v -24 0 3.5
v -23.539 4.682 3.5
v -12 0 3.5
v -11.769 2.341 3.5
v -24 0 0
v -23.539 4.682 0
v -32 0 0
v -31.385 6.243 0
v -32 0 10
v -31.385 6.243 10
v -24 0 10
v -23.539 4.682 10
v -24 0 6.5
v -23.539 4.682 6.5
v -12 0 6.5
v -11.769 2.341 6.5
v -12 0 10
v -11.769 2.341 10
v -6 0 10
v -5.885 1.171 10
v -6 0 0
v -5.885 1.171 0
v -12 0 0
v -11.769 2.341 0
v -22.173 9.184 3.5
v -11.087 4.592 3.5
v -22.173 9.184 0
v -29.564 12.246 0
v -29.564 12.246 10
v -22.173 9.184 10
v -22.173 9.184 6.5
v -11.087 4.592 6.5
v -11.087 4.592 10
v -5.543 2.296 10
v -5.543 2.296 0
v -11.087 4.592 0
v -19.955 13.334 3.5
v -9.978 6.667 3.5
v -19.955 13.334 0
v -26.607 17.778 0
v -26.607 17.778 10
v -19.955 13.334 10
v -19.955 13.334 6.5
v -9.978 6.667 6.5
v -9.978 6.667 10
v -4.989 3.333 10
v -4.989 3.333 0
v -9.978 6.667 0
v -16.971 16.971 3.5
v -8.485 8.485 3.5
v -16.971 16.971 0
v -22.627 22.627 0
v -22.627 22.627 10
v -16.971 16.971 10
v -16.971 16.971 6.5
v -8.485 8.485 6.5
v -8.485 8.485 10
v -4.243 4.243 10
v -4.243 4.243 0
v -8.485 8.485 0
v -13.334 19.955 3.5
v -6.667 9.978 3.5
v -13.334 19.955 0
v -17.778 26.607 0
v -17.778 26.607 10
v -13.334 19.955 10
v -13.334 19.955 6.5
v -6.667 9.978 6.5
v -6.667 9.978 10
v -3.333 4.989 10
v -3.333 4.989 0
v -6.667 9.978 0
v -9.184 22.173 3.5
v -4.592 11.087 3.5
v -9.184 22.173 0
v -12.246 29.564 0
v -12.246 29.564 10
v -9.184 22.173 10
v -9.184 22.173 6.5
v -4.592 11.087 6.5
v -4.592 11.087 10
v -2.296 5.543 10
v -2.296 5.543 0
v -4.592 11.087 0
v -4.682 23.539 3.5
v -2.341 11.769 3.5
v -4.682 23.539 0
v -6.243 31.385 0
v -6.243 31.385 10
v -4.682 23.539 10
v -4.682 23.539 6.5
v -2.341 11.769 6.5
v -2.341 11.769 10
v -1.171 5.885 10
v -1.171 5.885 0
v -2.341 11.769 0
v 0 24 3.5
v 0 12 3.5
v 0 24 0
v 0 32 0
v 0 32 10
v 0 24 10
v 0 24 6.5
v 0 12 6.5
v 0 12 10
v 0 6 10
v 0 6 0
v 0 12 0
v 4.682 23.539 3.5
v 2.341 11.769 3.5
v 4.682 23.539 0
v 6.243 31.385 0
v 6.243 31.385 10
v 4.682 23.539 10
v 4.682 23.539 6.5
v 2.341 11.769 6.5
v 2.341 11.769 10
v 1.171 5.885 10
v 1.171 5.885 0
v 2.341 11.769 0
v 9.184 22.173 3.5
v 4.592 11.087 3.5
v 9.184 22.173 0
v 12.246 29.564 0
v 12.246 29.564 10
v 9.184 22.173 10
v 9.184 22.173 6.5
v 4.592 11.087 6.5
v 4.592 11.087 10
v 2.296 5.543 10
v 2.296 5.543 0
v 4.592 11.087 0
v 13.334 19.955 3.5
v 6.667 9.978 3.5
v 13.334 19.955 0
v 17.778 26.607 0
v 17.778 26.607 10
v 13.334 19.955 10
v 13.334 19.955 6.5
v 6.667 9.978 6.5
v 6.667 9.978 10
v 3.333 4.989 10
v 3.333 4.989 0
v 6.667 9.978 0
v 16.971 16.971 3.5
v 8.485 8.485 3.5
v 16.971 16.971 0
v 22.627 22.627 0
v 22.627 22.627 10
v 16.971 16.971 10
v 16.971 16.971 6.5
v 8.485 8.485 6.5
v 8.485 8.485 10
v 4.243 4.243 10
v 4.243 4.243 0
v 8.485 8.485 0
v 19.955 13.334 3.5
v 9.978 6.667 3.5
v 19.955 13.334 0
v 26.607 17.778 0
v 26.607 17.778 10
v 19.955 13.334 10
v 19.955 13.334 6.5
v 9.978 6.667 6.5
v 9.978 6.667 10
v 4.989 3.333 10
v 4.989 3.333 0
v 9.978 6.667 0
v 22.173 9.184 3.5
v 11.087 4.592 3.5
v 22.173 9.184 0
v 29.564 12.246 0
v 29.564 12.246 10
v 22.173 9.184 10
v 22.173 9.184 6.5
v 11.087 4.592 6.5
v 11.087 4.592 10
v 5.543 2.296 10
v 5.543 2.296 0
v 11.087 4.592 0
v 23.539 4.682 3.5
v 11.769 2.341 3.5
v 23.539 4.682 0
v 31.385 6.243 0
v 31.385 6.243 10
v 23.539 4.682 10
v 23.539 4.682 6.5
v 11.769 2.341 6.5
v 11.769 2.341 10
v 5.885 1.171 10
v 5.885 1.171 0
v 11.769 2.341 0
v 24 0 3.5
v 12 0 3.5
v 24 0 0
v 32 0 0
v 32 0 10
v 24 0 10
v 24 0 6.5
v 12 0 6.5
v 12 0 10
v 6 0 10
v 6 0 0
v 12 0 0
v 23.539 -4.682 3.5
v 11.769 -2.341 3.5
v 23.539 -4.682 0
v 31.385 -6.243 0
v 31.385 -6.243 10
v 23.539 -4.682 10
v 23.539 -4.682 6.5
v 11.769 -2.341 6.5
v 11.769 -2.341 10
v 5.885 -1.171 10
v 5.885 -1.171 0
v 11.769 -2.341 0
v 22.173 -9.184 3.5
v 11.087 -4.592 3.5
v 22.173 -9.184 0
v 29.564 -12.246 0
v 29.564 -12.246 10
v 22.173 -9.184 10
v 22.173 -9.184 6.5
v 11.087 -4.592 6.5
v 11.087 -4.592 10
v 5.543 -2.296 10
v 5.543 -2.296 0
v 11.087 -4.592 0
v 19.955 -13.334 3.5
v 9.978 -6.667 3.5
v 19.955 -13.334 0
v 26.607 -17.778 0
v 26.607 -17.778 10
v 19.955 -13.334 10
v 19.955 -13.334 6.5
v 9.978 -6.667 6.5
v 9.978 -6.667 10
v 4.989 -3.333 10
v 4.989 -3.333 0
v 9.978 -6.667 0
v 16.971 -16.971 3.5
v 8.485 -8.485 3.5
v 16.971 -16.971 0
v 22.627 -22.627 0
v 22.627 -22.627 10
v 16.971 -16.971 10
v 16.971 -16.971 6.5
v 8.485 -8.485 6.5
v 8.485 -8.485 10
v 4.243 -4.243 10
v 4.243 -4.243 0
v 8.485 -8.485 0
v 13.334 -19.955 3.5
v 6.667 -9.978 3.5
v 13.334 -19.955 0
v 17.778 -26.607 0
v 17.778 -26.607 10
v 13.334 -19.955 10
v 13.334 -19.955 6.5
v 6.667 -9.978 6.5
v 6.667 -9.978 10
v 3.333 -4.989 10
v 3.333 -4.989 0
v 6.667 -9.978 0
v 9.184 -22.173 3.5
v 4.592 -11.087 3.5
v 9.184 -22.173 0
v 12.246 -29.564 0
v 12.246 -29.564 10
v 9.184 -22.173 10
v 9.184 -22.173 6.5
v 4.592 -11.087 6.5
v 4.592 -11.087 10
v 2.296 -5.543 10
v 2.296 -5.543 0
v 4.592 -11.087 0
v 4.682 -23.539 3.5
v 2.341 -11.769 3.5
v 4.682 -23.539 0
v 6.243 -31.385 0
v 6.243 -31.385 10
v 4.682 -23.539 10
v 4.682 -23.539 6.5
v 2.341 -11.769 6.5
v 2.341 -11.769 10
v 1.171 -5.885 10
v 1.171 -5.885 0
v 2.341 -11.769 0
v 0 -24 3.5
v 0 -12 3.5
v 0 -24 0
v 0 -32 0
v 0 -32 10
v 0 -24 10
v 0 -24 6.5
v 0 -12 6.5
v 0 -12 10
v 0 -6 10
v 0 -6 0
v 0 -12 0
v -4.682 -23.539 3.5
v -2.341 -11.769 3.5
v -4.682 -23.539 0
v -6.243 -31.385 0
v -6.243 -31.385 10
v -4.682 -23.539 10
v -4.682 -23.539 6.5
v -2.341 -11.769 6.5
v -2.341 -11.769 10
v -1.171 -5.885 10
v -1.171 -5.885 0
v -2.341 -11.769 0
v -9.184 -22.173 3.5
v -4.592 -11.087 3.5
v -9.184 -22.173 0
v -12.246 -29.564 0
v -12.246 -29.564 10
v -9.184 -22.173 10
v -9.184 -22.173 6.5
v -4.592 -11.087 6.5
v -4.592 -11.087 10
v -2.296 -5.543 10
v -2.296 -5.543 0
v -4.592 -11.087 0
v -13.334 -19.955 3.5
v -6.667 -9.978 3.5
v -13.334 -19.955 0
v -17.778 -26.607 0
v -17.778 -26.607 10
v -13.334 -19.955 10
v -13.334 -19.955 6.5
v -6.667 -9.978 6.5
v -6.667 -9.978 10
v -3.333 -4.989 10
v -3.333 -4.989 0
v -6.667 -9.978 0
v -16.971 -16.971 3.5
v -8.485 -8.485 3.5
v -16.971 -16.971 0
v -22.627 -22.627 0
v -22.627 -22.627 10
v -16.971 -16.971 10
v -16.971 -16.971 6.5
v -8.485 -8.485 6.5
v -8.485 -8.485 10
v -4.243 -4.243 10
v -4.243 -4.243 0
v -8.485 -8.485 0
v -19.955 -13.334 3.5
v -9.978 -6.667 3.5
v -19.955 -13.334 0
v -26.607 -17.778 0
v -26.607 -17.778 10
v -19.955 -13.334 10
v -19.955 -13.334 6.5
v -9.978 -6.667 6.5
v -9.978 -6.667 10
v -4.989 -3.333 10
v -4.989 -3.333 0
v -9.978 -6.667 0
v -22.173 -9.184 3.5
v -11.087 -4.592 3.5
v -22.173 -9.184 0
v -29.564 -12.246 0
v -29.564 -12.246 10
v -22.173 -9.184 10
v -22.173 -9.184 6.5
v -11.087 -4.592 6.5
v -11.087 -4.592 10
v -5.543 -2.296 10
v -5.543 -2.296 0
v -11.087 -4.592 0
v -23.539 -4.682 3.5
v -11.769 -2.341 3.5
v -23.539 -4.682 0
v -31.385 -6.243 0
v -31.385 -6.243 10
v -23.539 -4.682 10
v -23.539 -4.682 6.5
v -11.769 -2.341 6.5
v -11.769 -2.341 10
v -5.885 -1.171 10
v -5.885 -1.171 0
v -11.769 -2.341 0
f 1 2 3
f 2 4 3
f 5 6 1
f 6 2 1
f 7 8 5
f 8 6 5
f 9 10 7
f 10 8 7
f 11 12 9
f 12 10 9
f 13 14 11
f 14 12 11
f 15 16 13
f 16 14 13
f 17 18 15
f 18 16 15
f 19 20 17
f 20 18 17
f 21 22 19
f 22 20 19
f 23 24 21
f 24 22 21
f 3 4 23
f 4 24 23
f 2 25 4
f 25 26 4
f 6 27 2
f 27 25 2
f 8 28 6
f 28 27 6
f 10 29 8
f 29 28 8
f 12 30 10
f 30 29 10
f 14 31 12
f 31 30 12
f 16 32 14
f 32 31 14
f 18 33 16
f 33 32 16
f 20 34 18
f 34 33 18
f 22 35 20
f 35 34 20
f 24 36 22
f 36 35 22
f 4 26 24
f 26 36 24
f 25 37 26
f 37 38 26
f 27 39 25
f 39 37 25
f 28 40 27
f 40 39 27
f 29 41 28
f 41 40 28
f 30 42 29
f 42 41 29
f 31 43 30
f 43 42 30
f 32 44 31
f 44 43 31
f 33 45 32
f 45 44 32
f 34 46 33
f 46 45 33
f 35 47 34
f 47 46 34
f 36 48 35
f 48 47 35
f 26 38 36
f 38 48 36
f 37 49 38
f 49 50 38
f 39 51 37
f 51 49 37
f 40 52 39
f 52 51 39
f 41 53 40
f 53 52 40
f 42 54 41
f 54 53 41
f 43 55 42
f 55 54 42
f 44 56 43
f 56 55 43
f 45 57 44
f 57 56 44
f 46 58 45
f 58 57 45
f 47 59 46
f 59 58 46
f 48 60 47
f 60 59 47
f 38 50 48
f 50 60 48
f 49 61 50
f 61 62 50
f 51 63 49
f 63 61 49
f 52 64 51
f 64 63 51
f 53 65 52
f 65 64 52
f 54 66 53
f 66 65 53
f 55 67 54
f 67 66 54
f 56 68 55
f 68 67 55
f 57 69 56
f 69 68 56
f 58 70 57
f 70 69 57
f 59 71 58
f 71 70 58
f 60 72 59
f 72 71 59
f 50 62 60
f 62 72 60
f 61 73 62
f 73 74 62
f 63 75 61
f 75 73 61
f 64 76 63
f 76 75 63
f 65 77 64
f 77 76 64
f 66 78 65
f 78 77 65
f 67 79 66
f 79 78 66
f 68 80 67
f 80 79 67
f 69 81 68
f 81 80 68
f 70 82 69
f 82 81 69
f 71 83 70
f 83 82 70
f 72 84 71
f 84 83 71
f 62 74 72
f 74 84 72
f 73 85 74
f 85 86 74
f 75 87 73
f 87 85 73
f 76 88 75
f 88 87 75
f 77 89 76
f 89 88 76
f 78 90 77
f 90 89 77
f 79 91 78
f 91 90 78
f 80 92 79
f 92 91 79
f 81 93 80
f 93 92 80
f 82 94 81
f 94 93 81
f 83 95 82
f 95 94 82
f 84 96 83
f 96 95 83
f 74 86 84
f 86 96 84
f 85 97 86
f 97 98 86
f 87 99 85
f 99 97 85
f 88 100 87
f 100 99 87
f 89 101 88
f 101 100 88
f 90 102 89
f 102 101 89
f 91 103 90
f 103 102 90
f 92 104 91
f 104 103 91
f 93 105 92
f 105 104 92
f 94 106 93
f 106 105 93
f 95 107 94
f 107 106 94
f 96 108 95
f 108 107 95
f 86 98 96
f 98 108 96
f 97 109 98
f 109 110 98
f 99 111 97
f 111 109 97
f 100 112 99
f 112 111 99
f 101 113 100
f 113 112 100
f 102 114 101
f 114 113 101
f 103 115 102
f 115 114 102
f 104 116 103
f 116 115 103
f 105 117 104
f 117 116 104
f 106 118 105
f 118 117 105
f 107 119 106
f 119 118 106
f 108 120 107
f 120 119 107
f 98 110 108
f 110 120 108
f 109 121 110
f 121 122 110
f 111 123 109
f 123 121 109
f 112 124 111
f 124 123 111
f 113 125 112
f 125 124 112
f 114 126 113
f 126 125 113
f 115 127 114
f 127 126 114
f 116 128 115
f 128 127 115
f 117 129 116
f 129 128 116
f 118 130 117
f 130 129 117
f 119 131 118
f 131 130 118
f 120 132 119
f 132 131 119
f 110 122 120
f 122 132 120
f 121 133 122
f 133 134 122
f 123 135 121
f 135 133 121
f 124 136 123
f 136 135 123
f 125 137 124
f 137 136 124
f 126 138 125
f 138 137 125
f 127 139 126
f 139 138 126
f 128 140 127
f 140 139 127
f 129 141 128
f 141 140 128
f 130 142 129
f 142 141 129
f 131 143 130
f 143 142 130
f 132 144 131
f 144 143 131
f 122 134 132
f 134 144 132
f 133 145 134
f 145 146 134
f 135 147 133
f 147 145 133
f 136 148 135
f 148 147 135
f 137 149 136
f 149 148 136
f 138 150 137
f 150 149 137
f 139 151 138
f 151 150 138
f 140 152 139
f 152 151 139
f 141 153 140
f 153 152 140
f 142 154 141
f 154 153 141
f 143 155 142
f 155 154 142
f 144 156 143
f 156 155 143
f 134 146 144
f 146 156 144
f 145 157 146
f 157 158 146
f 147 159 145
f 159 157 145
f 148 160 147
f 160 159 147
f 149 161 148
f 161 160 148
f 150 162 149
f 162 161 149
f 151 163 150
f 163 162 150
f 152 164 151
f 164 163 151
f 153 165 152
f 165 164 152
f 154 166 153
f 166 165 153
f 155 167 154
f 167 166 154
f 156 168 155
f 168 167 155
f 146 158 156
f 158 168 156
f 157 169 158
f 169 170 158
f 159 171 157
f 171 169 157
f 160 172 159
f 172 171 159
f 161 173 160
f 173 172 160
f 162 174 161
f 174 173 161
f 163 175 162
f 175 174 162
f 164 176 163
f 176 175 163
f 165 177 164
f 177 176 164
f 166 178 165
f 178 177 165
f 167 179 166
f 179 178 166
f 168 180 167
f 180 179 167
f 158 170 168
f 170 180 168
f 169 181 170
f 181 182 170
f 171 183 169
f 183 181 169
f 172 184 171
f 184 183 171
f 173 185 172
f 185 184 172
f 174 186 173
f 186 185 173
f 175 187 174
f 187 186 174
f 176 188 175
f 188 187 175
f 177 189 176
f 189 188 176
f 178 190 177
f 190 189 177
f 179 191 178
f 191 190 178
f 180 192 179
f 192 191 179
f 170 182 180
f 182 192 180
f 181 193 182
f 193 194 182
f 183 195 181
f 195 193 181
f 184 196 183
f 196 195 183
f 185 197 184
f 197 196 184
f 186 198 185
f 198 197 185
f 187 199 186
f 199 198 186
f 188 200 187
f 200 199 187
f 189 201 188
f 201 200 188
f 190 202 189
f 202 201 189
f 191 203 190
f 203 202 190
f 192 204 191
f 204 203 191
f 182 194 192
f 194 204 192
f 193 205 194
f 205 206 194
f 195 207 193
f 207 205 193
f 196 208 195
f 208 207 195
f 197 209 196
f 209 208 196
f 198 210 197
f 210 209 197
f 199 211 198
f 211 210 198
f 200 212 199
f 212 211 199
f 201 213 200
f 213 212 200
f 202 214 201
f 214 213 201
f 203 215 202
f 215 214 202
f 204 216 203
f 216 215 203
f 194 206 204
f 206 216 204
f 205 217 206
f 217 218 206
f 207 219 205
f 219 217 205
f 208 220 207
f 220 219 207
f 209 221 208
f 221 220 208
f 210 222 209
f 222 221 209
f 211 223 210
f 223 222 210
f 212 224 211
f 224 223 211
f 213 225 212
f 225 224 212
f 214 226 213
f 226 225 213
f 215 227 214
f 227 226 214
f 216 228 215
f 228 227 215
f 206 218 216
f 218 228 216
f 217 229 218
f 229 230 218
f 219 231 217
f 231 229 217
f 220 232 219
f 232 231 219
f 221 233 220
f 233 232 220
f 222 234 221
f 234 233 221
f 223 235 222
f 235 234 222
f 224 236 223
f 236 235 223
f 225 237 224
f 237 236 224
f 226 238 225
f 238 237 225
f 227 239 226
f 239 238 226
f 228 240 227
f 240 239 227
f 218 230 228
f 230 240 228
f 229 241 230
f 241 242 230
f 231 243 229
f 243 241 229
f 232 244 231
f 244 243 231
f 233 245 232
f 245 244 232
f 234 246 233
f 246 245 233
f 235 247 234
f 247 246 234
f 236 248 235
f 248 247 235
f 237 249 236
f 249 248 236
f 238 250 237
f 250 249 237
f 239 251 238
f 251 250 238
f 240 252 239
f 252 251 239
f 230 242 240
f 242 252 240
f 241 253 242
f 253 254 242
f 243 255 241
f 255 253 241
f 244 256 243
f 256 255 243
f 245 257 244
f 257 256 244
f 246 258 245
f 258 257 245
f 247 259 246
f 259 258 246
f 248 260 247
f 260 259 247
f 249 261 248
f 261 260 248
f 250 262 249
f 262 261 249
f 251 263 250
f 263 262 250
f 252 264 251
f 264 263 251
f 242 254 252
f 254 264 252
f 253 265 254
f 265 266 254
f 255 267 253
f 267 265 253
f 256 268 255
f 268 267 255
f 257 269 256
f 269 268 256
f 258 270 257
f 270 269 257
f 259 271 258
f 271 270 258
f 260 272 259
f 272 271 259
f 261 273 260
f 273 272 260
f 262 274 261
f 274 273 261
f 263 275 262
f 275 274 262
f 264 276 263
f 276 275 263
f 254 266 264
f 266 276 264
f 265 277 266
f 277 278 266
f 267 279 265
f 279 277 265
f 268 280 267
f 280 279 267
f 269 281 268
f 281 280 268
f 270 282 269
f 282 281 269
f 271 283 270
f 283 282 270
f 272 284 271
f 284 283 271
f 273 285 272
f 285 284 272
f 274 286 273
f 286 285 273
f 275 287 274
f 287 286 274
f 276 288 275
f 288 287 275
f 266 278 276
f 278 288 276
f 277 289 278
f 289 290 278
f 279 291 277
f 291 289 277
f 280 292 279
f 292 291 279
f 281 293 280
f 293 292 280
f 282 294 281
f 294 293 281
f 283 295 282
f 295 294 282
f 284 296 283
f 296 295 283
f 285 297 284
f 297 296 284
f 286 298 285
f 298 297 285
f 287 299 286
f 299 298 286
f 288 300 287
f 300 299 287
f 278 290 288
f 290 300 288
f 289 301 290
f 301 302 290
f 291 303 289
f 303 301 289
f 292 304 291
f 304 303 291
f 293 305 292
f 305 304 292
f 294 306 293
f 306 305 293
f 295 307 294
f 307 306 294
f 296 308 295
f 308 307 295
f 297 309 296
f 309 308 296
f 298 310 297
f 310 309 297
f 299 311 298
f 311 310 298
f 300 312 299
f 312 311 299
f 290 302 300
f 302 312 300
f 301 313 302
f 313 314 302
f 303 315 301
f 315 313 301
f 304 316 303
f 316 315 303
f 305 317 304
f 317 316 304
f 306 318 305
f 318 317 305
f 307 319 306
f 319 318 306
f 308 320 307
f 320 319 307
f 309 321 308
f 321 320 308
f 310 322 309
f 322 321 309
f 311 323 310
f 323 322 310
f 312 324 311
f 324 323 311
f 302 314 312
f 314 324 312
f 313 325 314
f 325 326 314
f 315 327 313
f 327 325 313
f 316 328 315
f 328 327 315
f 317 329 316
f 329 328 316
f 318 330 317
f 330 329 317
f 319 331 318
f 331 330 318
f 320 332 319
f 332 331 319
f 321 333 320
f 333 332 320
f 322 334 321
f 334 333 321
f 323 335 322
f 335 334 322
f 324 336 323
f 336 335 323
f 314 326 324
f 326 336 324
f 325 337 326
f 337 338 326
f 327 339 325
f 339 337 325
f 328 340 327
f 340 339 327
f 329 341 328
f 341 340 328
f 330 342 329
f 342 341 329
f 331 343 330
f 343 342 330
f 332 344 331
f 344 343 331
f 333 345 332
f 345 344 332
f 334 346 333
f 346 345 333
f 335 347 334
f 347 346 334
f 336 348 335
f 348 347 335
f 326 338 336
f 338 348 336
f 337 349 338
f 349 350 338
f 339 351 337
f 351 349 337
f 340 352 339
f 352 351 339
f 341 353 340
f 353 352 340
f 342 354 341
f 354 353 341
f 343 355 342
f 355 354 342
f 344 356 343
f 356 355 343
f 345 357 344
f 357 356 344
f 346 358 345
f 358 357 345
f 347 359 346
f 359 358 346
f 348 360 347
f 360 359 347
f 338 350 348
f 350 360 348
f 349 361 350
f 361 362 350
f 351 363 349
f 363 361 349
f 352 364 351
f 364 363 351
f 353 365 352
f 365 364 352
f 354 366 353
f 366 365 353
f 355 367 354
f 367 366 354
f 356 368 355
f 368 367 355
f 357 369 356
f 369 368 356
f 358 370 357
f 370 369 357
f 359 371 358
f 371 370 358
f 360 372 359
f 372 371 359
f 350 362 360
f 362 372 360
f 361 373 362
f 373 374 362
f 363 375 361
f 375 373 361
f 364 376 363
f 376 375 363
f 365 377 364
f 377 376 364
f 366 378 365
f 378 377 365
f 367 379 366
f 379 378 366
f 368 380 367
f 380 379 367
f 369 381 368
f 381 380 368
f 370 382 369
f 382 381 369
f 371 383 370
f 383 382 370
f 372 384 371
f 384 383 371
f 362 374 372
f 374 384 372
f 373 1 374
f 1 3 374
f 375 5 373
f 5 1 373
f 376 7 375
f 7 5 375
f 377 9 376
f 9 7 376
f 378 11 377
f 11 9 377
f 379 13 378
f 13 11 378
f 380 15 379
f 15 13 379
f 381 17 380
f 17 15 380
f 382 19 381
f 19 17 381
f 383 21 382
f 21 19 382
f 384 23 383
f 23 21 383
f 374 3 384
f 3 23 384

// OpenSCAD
$fn = 32;

// ----------------------------------------------------------------------
// Revolved part: handwheel R32
// ----------------------------------------------------------------------

// --- parameters (mm) ---
bore_r = 6;               // bore radius
rim_r = 32;               // rim radius
rim_w = 8;                // rim axial width
rim_t = 10;               // rim diameter height
hub_r = 12;               // hub radius
web_t = 3;                // web thickness
revolve_angle = 360;      // revolve sweep, degrees

bore_d = 2 * bore_r;
rim_d = 2 * rim_r;
hub_d = 2 * hub_r;

profile = [[6, 0], [12, 0], [12, 3.5], [24, 3.5], [24, 0], [32, 0], [32, 10], [24, 10], [24, 6.5], [12, 6.5], [12, 10], [6, 10]];  // primary outline, 12 points, counter clockwise

// --- the one profile operation ---
rotate_extrude(angle = revolve_angle) polygon(points = profile);
